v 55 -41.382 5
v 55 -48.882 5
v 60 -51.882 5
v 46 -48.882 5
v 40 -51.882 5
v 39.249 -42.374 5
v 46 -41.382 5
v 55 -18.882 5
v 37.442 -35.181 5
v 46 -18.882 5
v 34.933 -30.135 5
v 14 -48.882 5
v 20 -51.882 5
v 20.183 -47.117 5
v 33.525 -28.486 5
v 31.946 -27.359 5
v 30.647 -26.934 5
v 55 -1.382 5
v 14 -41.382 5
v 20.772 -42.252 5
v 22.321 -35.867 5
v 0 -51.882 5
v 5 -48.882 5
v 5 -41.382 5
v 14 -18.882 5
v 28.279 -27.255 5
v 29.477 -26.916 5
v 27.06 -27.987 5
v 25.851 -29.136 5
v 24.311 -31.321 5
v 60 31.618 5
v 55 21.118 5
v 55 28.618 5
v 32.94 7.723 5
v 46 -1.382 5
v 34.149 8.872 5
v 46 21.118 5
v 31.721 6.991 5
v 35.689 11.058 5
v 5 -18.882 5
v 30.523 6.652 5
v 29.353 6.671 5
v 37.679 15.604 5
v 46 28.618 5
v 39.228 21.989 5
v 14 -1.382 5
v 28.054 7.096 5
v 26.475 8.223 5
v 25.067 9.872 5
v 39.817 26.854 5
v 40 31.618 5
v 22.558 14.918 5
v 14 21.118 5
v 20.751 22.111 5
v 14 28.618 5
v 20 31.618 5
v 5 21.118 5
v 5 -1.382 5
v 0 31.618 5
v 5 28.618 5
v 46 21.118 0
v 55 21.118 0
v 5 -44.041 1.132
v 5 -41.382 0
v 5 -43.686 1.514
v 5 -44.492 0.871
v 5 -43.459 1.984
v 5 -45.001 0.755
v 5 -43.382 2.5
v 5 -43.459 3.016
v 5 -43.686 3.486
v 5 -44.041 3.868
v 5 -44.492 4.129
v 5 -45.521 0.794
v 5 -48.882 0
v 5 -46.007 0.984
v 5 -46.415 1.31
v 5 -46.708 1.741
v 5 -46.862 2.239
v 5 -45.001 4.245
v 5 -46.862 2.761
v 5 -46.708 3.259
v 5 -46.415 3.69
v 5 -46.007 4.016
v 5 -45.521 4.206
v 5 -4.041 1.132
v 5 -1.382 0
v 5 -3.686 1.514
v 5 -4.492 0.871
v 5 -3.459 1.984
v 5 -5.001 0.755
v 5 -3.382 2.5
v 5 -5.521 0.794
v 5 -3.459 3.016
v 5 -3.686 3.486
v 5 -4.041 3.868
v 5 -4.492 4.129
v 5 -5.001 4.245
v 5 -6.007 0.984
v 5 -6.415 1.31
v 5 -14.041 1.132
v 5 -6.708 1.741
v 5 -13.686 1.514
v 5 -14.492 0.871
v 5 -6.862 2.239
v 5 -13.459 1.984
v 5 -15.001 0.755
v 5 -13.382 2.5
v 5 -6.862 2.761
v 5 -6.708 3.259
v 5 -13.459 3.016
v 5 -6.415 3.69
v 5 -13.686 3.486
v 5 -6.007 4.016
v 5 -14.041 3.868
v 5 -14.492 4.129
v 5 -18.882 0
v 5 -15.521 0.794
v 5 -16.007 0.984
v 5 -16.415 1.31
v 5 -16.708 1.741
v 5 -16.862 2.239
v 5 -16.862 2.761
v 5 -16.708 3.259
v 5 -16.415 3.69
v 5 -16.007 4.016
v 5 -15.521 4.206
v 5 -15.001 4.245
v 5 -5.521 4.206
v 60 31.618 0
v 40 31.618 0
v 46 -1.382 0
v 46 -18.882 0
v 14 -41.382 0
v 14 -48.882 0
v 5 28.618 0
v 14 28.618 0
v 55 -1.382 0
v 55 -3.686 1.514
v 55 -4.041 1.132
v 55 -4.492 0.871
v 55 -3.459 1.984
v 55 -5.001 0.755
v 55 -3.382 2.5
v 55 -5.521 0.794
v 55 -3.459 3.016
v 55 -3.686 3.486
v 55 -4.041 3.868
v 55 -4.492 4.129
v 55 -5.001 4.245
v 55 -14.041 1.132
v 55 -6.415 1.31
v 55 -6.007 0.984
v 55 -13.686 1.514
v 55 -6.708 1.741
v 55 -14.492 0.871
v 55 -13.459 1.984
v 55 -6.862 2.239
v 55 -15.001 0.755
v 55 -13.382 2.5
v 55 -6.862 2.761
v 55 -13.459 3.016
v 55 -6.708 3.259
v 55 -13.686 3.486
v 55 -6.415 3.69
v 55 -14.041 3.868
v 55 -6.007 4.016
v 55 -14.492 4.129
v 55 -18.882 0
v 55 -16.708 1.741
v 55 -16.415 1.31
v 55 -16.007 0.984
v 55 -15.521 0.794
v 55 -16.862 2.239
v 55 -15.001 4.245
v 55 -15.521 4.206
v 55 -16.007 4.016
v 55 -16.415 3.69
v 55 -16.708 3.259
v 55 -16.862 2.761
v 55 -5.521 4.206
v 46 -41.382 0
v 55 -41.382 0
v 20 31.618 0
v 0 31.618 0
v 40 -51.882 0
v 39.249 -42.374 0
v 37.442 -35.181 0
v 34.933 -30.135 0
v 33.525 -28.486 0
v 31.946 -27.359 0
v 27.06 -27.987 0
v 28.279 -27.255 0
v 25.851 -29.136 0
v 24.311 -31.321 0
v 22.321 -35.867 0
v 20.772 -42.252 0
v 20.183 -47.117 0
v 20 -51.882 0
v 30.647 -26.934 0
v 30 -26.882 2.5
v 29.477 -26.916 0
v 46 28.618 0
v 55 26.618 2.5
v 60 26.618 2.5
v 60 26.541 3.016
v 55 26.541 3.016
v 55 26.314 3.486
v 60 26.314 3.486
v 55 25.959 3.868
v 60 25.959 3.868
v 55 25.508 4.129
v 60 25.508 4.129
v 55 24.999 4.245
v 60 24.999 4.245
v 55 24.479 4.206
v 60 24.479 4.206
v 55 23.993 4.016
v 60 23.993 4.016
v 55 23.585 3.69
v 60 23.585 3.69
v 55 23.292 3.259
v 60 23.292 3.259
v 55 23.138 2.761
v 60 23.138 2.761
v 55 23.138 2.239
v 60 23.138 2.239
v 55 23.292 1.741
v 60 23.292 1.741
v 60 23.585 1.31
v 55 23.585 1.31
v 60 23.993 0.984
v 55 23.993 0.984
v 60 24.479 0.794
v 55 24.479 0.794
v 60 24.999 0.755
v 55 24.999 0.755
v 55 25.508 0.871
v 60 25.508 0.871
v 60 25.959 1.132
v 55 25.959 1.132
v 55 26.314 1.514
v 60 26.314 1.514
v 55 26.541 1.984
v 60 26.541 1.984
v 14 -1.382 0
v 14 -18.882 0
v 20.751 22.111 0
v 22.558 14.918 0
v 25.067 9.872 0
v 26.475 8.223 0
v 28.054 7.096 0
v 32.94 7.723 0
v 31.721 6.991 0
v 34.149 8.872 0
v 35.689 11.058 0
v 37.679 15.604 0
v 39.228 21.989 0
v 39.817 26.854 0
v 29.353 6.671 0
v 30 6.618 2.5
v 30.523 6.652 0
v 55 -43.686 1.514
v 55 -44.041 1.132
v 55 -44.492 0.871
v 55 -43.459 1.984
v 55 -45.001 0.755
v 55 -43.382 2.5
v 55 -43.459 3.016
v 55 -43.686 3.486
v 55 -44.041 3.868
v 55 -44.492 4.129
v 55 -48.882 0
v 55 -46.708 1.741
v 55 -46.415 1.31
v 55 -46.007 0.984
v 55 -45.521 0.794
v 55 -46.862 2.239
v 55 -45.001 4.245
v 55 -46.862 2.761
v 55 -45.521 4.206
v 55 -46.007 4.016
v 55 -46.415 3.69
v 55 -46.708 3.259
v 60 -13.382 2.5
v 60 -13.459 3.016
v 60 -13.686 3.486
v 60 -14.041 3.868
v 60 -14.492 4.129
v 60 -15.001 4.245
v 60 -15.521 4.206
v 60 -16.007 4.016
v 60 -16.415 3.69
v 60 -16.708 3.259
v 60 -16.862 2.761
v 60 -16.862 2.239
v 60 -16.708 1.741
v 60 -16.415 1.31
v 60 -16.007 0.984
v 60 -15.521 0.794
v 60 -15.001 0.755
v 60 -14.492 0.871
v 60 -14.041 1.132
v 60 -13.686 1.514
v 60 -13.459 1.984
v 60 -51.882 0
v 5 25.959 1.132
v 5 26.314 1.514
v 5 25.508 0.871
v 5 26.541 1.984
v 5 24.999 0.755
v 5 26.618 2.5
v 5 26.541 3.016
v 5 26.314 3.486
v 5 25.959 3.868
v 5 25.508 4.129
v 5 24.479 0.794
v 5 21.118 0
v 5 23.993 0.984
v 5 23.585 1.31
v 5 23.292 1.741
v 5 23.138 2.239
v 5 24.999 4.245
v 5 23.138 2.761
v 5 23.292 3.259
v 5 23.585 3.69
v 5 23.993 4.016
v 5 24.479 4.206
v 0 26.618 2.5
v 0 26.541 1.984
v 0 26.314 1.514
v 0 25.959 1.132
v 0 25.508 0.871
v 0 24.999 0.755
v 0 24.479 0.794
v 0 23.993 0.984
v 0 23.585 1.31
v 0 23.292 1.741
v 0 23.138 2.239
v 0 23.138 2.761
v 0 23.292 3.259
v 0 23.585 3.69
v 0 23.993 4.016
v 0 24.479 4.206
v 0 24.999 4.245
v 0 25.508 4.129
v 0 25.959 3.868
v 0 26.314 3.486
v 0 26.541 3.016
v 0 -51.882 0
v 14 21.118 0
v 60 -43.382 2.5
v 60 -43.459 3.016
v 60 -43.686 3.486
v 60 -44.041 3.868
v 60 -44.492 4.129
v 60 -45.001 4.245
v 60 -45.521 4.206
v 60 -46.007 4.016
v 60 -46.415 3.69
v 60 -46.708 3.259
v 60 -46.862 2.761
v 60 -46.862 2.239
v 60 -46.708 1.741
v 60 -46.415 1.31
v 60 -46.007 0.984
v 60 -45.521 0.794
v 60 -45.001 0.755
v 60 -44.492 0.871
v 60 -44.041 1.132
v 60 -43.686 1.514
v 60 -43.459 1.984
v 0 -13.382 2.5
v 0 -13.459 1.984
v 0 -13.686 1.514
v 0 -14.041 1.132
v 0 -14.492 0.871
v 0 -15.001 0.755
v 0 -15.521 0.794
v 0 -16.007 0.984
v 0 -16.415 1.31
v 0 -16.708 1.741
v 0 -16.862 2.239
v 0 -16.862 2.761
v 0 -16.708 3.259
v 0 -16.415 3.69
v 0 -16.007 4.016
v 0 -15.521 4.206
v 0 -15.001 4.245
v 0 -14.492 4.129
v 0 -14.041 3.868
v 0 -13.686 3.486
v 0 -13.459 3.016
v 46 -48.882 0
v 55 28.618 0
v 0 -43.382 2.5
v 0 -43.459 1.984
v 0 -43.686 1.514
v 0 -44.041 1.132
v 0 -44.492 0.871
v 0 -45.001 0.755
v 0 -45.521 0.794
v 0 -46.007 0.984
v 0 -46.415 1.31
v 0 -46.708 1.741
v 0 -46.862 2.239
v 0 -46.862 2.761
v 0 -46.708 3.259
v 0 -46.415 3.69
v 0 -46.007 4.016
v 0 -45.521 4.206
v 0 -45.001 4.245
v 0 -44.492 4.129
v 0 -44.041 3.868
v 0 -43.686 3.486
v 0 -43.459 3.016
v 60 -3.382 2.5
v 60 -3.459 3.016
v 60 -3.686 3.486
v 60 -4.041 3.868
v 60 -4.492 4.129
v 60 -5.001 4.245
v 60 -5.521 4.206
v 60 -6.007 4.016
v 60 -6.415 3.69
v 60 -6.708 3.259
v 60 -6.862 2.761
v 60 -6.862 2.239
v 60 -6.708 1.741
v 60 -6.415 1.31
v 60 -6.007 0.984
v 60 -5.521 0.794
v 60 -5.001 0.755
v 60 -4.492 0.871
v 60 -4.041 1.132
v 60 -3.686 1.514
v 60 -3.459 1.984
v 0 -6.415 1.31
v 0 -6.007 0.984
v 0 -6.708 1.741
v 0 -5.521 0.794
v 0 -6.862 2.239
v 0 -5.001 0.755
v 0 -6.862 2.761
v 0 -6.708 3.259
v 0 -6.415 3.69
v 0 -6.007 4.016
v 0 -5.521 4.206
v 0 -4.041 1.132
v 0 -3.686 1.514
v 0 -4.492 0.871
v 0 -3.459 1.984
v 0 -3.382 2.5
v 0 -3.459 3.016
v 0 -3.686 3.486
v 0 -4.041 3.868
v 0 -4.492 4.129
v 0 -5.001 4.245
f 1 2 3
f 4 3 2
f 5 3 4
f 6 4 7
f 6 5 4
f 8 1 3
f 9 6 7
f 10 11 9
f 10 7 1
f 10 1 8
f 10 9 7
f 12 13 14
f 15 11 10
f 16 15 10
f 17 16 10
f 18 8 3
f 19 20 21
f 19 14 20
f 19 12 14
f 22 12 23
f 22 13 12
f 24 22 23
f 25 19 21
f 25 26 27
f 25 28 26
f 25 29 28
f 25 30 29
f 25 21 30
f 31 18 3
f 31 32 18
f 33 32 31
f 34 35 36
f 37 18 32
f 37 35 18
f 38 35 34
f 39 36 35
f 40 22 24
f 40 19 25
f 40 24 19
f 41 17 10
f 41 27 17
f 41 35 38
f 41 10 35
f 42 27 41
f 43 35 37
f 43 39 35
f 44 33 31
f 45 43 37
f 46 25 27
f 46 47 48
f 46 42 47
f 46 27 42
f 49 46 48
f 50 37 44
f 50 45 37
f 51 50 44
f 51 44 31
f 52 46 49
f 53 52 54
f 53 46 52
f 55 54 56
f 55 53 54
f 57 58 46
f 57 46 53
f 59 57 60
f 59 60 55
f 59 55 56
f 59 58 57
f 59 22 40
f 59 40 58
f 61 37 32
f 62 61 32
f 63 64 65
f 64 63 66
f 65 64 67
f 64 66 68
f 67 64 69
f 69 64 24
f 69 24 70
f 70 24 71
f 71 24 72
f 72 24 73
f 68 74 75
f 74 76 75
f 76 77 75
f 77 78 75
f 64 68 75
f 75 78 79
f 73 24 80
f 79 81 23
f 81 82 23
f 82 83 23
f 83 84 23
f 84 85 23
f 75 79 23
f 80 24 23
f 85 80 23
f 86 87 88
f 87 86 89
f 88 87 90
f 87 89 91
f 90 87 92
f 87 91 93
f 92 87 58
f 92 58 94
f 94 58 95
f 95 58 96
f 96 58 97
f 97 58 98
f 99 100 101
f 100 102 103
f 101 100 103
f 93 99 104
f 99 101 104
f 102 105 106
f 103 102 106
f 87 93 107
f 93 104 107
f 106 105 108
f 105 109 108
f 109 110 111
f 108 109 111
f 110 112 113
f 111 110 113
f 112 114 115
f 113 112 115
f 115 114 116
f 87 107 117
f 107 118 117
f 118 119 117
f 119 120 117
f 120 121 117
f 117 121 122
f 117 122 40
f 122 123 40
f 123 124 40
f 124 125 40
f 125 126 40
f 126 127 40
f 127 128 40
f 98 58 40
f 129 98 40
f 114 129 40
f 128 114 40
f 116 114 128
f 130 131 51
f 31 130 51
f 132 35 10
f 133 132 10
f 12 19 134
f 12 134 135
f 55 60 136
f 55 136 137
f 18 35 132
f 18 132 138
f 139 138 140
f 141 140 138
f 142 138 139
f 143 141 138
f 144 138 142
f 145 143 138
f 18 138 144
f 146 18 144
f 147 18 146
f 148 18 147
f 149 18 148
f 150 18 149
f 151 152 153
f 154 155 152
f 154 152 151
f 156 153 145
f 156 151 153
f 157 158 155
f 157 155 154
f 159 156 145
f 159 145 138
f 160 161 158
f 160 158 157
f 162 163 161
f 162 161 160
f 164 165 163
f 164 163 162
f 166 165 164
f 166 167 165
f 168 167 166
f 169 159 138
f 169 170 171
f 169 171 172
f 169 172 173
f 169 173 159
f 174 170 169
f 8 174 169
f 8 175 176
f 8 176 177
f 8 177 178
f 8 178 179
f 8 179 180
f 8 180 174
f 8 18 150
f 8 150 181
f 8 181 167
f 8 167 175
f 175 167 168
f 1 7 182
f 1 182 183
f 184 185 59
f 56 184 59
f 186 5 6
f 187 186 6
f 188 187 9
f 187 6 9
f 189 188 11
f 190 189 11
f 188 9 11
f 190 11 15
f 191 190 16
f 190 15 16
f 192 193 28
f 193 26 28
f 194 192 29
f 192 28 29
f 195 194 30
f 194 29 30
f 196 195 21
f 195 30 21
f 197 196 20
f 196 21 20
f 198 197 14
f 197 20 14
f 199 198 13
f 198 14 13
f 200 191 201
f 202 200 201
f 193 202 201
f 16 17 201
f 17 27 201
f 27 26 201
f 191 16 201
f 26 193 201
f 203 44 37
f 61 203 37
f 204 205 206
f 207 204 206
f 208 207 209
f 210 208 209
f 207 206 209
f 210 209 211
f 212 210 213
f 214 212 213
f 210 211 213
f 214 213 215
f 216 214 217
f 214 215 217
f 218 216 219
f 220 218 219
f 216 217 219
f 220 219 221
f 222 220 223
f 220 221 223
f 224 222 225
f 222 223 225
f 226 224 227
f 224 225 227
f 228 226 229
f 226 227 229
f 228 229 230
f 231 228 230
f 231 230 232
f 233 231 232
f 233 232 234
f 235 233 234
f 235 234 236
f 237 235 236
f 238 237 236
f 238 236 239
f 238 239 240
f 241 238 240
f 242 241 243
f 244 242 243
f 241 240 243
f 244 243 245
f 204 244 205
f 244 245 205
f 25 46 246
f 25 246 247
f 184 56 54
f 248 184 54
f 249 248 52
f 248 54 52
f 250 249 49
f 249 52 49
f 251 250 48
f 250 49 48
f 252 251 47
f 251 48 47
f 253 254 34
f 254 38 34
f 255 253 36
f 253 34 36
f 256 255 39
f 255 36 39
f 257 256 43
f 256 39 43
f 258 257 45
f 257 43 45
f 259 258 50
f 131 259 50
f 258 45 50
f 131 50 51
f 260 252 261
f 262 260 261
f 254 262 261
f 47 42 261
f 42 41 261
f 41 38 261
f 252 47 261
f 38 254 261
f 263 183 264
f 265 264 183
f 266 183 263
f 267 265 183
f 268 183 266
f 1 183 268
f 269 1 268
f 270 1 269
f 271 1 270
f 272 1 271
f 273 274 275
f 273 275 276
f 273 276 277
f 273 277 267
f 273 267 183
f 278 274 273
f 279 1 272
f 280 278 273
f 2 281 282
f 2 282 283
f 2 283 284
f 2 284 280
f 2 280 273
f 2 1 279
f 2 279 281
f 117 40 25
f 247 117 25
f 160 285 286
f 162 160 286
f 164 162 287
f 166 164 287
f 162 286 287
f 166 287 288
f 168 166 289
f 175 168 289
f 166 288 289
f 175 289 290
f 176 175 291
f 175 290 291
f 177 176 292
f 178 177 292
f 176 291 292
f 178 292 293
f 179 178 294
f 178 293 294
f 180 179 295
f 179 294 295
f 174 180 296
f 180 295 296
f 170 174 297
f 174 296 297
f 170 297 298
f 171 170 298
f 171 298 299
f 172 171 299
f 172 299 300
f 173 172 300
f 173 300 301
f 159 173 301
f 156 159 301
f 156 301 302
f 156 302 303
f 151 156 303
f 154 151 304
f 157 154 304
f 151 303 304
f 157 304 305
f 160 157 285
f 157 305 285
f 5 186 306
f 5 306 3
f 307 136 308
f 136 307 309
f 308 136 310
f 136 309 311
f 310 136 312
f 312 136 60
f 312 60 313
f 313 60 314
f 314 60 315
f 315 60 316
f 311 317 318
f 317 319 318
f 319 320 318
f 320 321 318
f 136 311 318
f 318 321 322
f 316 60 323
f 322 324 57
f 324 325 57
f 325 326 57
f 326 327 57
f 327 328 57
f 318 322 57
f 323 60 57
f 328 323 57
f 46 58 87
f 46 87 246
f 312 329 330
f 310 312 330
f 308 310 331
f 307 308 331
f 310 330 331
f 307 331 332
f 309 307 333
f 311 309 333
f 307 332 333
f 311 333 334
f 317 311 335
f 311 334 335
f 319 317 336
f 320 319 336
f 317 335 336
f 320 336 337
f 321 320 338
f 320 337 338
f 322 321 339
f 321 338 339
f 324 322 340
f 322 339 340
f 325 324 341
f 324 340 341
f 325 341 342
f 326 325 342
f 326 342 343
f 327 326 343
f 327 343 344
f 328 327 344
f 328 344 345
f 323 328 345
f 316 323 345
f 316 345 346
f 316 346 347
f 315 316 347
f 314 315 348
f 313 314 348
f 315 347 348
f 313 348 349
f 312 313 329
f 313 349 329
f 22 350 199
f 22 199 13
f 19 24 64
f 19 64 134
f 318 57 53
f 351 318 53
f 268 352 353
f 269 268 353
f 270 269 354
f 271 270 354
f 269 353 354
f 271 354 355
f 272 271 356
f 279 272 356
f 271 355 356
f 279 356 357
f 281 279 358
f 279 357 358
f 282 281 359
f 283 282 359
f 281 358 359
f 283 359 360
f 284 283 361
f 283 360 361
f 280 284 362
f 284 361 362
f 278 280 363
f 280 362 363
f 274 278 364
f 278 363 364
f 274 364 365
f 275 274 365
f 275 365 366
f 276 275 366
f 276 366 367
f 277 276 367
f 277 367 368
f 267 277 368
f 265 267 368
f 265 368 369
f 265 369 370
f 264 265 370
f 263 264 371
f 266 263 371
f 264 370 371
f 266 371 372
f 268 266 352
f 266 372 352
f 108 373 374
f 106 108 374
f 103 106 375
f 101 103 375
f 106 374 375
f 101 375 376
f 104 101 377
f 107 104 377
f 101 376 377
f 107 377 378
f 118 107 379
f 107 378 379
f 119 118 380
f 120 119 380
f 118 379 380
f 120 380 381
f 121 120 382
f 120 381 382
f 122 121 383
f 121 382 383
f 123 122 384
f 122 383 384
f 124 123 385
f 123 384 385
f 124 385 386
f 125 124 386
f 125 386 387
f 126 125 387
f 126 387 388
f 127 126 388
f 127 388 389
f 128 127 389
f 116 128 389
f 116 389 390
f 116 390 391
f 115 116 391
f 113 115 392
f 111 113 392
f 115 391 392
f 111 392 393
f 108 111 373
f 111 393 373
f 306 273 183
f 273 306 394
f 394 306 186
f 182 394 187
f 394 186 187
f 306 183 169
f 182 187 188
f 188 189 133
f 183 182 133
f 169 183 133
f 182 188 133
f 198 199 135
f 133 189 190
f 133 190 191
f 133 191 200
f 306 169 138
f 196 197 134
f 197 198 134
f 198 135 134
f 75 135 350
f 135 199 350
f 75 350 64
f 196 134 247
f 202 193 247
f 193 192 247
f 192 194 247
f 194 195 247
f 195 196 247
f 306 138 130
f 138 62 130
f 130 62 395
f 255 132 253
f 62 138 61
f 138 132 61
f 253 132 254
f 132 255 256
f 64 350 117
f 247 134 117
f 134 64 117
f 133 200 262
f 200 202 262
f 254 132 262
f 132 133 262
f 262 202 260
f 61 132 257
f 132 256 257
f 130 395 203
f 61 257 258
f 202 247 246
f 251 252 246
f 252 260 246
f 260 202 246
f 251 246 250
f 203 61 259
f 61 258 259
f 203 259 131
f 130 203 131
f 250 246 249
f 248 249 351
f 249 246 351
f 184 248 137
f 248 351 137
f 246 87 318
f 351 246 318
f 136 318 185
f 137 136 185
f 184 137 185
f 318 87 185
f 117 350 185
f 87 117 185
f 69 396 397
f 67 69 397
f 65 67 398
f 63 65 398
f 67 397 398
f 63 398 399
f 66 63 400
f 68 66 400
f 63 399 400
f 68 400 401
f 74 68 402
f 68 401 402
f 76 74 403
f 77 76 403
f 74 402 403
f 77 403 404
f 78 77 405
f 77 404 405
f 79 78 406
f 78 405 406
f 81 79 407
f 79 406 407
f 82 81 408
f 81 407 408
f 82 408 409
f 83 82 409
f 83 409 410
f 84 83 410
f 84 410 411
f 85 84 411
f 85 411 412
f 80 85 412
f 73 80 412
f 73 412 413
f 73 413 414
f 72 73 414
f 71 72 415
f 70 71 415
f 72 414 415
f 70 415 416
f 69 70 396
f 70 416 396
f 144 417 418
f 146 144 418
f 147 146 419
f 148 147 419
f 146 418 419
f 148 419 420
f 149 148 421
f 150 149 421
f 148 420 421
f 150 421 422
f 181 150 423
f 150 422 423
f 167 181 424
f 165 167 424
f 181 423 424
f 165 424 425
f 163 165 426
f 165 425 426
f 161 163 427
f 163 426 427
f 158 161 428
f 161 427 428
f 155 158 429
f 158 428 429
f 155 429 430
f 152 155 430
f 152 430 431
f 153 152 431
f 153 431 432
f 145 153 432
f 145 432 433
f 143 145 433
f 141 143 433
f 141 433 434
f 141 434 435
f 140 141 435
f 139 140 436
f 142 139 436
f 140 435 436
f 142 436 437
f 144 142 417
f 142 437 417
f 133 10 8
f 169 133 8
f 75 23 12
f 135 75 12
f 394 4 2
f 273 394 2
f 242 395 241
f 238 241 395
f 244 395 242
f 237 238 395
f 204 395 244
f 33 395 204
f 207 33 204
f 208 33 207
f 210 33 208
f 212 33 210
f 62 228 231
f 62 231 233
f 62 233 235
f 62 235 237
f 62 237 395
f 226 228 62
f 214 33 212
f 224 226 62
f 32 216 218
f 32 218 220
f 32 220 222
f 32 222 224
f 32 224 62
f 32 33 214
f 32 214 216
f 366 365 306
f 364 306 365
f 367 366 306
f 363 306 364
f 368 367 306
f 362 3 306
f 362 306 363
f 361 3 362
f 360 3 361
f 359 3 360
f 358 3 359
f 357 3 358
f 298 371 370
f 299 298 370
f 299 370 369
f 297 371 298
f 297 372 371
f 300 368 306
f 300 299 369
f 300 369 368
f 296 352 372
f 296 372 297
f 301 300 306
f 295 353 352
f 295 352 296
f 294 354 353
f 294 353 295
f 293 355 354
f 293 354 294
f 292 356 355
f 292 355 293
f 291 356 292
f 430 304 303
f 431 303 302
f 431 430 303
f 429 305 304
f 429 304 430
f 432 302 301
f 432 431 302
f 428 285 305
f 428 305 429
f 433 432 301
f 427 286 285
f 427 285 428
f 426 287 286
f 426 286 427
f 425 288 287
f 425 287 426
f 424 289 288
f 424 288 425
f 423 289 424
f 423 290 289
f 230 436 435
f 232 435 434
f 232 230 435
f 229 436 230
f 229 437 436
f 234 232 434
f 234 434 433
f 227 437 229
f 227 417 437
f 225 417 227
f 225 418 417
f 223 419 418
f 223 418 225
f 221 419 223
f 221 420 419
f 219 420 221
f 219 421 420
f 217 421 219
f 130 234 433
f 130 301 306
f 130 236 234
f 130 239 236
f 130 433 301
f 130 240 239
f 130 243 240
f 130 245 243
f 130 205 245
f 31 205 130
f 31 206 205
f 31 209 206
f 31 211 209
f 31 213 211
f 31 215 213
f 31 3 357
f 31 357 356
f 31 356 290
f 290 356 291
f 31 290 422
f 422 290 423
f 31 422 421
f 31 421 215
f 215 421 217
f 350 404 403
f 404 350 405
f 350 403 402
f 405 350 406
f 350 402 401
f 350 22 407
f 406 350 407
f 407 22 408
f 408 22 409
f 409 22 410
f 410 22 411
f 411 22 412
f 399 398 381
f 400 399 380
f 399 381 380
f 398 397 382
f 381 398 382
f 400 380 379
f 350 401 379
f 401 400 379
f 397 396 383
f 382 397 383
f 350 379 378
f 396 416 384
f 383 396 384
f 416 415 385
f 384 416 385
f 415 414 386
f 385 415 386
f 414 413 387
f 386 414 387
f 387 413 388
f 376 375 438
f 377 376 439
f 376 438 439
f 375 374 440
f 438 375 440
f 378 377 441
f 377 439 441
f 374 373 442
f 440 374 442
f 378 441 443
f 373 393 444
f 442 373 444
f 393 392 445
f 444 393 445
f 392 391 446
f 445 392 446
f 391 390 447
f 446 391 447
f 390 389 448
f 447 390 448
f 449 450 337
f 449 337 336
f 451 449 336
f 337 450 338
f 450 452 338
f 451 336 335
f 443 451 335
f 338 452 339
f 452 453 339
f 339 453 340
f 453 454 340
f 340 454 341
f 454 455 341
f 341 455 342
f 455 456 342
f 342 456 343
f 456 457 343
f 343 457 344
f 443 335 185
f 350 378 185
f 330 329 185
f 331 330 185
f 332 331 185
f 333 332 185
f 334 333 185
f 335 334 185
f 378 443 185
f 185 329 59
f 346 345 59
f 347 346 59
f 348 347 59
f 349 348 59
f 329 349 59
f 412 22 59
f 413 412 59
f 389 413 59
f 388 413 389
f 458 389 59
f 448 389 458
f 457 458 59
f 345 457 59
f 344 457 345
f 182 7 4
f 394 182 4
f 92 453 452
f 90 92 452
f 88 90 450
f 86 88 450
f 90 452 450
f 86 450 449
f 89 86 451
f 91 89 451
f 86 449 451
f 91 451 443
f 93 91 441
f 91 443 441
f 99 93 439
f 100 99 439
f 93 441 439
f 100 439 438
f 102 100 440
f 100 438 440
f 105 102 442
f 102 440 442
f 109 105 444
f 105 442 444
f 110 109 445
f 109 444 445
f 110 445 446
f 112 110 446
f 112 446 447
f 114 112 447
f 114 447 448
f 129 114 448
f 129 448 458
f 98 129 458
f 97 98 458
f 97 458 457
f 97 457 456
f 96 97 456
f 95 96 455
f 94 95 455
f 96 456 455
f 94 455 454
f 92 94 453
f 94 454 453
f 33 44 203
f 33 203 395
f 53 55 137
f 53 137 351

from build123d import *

# Parameters (mm, degrees)
SKETCH003_W     = 83.5
SKETCH003_H     = 5
PAD002_DEPTH    = 60
SKETCH005_W     = 7.5
SKETCH005_H     = 9
SKETCH005_W_2   = 17.5
POCKET001_DEPTH = 5
SKETCH004_R     = 1.75
POCKET002_DEPTH = 5
SKETCH006_R     = 1.75
POCKET003_DEPTH = 5


with BuildPart() as part:
    # Sketch003 → Pad002 (new body)
    with BuildSketch(Plane.YZ):
        with Locations((-10.131726, 2.5)):
            Rectangle(SKETCH003_W, SKETCH003_H)
    extrude(amount=PAD002_DEPTH)

    # Sketch005 (on Face4 of Pad002) → Pocket001 (cut)
    with BuildSketch(Plane(origin=(0, 0, 5), x_dir=(0, -1, 0), z_dir=(0, 0, 1))):
        with Locations((-24.868274, 50.5)):
            Rectangle(SKETCH005_W, SKETCH005_H)
        with Locations((10.131726, 50.5)):
            Rectangle(SKETCH005_W_2, SKETCH005_H)
        with Locations((45.131726, 50.5)):
            Rectangle(SKETCH005_W, SKETCH005_H)
        with Locations((-24.868274, 9.5)):
            Rectangle(SKETCH005_W, SKETCH005_H)
        with Locations((10.131726, 9.5)):
            Rectangle(SKETCH005_W_2, SKETCH005_H)
        with Locations((45.131726, 9.5)):
            Rectangle(SKETCH005_W, SKETCH005_H)
        with BuildLine():
            add(Edge.make_bspline(
                [(-31.618274, 20), (-6.618274, 20), (-6.618274, 30), (-6.618274, 40), (-31.618274, 40)],
                knots=[4.712389, 4.712389, 4.712389, 6.283185, 6.283185, 7.853982, 7.853982, 7.853982], degree=2, weights=[1, 0.707107, 1, 0.707107, 1]))
            Line((-31.618274, 40), (-31.618274, 20))
        make_face()
        with BuildLine():
            add(Edge.make_bspline(
                [(51.881726, 40), (26.881726, 40), (26.881726, 30), (26.881726, 20), (51.881726, 20)],
                knots=[4.712389, 4.712389, 4.712389, 6.283185, 6.283185, 7.853982, 7.853982, 7.853982], degree=2, weights=[1, 0.707107, 1, 0.707107, 1]))
            Line((51.881726, 20), (51.881726, 40))
        make_face()
    extrude(amount=-POCKET001_DEPTH, mode=Mode.SUBTRACT)

    # Sketch004 (on Face5 of Pad002) → Pocket002 (cut)
    with BuildSketch(Plane(origin=(0, 0, 0), x_dir=(0, 1, 0), z_dir=(-1, 0, 0))):
        with Locations((24.868274, -2.5)):
            Circle(SKETCH004_R)
        with Locations((-5.131726, -2.5)):
            Circle(SKETCH004_R)
        with Locations((-15.131726, -2.5)):
            Circle(SKETCH004_R)
        with Locations((-45.131726, -2.5)):
            Circle(SKETCH004_R)
    extrude(amount=-POCKET002_DEPTH, mode=Mode.SUBTRACT)

    # Sketch006 (on Face6 of Pad002) → Pocket003 (cut)
    with BuildSketch(Plane.YZ.offset(60)):
        with Locations((-45.131726, 2.5)):
            Circle(SKETCH006_R)
        with Locations((-15.131726, 2.5)):
            Circle(SKETCH006_R)
        with Locations((-5.131726, 2.5)):
            Circle(SKETCH006_R)
        with Locations((24.868274, 2.5)):
            Circle(SKETCH006_R)
    extrude(amount=-POCKET003_DEPTH, mode=Mode.SUBTRACT)


solid = part.part
